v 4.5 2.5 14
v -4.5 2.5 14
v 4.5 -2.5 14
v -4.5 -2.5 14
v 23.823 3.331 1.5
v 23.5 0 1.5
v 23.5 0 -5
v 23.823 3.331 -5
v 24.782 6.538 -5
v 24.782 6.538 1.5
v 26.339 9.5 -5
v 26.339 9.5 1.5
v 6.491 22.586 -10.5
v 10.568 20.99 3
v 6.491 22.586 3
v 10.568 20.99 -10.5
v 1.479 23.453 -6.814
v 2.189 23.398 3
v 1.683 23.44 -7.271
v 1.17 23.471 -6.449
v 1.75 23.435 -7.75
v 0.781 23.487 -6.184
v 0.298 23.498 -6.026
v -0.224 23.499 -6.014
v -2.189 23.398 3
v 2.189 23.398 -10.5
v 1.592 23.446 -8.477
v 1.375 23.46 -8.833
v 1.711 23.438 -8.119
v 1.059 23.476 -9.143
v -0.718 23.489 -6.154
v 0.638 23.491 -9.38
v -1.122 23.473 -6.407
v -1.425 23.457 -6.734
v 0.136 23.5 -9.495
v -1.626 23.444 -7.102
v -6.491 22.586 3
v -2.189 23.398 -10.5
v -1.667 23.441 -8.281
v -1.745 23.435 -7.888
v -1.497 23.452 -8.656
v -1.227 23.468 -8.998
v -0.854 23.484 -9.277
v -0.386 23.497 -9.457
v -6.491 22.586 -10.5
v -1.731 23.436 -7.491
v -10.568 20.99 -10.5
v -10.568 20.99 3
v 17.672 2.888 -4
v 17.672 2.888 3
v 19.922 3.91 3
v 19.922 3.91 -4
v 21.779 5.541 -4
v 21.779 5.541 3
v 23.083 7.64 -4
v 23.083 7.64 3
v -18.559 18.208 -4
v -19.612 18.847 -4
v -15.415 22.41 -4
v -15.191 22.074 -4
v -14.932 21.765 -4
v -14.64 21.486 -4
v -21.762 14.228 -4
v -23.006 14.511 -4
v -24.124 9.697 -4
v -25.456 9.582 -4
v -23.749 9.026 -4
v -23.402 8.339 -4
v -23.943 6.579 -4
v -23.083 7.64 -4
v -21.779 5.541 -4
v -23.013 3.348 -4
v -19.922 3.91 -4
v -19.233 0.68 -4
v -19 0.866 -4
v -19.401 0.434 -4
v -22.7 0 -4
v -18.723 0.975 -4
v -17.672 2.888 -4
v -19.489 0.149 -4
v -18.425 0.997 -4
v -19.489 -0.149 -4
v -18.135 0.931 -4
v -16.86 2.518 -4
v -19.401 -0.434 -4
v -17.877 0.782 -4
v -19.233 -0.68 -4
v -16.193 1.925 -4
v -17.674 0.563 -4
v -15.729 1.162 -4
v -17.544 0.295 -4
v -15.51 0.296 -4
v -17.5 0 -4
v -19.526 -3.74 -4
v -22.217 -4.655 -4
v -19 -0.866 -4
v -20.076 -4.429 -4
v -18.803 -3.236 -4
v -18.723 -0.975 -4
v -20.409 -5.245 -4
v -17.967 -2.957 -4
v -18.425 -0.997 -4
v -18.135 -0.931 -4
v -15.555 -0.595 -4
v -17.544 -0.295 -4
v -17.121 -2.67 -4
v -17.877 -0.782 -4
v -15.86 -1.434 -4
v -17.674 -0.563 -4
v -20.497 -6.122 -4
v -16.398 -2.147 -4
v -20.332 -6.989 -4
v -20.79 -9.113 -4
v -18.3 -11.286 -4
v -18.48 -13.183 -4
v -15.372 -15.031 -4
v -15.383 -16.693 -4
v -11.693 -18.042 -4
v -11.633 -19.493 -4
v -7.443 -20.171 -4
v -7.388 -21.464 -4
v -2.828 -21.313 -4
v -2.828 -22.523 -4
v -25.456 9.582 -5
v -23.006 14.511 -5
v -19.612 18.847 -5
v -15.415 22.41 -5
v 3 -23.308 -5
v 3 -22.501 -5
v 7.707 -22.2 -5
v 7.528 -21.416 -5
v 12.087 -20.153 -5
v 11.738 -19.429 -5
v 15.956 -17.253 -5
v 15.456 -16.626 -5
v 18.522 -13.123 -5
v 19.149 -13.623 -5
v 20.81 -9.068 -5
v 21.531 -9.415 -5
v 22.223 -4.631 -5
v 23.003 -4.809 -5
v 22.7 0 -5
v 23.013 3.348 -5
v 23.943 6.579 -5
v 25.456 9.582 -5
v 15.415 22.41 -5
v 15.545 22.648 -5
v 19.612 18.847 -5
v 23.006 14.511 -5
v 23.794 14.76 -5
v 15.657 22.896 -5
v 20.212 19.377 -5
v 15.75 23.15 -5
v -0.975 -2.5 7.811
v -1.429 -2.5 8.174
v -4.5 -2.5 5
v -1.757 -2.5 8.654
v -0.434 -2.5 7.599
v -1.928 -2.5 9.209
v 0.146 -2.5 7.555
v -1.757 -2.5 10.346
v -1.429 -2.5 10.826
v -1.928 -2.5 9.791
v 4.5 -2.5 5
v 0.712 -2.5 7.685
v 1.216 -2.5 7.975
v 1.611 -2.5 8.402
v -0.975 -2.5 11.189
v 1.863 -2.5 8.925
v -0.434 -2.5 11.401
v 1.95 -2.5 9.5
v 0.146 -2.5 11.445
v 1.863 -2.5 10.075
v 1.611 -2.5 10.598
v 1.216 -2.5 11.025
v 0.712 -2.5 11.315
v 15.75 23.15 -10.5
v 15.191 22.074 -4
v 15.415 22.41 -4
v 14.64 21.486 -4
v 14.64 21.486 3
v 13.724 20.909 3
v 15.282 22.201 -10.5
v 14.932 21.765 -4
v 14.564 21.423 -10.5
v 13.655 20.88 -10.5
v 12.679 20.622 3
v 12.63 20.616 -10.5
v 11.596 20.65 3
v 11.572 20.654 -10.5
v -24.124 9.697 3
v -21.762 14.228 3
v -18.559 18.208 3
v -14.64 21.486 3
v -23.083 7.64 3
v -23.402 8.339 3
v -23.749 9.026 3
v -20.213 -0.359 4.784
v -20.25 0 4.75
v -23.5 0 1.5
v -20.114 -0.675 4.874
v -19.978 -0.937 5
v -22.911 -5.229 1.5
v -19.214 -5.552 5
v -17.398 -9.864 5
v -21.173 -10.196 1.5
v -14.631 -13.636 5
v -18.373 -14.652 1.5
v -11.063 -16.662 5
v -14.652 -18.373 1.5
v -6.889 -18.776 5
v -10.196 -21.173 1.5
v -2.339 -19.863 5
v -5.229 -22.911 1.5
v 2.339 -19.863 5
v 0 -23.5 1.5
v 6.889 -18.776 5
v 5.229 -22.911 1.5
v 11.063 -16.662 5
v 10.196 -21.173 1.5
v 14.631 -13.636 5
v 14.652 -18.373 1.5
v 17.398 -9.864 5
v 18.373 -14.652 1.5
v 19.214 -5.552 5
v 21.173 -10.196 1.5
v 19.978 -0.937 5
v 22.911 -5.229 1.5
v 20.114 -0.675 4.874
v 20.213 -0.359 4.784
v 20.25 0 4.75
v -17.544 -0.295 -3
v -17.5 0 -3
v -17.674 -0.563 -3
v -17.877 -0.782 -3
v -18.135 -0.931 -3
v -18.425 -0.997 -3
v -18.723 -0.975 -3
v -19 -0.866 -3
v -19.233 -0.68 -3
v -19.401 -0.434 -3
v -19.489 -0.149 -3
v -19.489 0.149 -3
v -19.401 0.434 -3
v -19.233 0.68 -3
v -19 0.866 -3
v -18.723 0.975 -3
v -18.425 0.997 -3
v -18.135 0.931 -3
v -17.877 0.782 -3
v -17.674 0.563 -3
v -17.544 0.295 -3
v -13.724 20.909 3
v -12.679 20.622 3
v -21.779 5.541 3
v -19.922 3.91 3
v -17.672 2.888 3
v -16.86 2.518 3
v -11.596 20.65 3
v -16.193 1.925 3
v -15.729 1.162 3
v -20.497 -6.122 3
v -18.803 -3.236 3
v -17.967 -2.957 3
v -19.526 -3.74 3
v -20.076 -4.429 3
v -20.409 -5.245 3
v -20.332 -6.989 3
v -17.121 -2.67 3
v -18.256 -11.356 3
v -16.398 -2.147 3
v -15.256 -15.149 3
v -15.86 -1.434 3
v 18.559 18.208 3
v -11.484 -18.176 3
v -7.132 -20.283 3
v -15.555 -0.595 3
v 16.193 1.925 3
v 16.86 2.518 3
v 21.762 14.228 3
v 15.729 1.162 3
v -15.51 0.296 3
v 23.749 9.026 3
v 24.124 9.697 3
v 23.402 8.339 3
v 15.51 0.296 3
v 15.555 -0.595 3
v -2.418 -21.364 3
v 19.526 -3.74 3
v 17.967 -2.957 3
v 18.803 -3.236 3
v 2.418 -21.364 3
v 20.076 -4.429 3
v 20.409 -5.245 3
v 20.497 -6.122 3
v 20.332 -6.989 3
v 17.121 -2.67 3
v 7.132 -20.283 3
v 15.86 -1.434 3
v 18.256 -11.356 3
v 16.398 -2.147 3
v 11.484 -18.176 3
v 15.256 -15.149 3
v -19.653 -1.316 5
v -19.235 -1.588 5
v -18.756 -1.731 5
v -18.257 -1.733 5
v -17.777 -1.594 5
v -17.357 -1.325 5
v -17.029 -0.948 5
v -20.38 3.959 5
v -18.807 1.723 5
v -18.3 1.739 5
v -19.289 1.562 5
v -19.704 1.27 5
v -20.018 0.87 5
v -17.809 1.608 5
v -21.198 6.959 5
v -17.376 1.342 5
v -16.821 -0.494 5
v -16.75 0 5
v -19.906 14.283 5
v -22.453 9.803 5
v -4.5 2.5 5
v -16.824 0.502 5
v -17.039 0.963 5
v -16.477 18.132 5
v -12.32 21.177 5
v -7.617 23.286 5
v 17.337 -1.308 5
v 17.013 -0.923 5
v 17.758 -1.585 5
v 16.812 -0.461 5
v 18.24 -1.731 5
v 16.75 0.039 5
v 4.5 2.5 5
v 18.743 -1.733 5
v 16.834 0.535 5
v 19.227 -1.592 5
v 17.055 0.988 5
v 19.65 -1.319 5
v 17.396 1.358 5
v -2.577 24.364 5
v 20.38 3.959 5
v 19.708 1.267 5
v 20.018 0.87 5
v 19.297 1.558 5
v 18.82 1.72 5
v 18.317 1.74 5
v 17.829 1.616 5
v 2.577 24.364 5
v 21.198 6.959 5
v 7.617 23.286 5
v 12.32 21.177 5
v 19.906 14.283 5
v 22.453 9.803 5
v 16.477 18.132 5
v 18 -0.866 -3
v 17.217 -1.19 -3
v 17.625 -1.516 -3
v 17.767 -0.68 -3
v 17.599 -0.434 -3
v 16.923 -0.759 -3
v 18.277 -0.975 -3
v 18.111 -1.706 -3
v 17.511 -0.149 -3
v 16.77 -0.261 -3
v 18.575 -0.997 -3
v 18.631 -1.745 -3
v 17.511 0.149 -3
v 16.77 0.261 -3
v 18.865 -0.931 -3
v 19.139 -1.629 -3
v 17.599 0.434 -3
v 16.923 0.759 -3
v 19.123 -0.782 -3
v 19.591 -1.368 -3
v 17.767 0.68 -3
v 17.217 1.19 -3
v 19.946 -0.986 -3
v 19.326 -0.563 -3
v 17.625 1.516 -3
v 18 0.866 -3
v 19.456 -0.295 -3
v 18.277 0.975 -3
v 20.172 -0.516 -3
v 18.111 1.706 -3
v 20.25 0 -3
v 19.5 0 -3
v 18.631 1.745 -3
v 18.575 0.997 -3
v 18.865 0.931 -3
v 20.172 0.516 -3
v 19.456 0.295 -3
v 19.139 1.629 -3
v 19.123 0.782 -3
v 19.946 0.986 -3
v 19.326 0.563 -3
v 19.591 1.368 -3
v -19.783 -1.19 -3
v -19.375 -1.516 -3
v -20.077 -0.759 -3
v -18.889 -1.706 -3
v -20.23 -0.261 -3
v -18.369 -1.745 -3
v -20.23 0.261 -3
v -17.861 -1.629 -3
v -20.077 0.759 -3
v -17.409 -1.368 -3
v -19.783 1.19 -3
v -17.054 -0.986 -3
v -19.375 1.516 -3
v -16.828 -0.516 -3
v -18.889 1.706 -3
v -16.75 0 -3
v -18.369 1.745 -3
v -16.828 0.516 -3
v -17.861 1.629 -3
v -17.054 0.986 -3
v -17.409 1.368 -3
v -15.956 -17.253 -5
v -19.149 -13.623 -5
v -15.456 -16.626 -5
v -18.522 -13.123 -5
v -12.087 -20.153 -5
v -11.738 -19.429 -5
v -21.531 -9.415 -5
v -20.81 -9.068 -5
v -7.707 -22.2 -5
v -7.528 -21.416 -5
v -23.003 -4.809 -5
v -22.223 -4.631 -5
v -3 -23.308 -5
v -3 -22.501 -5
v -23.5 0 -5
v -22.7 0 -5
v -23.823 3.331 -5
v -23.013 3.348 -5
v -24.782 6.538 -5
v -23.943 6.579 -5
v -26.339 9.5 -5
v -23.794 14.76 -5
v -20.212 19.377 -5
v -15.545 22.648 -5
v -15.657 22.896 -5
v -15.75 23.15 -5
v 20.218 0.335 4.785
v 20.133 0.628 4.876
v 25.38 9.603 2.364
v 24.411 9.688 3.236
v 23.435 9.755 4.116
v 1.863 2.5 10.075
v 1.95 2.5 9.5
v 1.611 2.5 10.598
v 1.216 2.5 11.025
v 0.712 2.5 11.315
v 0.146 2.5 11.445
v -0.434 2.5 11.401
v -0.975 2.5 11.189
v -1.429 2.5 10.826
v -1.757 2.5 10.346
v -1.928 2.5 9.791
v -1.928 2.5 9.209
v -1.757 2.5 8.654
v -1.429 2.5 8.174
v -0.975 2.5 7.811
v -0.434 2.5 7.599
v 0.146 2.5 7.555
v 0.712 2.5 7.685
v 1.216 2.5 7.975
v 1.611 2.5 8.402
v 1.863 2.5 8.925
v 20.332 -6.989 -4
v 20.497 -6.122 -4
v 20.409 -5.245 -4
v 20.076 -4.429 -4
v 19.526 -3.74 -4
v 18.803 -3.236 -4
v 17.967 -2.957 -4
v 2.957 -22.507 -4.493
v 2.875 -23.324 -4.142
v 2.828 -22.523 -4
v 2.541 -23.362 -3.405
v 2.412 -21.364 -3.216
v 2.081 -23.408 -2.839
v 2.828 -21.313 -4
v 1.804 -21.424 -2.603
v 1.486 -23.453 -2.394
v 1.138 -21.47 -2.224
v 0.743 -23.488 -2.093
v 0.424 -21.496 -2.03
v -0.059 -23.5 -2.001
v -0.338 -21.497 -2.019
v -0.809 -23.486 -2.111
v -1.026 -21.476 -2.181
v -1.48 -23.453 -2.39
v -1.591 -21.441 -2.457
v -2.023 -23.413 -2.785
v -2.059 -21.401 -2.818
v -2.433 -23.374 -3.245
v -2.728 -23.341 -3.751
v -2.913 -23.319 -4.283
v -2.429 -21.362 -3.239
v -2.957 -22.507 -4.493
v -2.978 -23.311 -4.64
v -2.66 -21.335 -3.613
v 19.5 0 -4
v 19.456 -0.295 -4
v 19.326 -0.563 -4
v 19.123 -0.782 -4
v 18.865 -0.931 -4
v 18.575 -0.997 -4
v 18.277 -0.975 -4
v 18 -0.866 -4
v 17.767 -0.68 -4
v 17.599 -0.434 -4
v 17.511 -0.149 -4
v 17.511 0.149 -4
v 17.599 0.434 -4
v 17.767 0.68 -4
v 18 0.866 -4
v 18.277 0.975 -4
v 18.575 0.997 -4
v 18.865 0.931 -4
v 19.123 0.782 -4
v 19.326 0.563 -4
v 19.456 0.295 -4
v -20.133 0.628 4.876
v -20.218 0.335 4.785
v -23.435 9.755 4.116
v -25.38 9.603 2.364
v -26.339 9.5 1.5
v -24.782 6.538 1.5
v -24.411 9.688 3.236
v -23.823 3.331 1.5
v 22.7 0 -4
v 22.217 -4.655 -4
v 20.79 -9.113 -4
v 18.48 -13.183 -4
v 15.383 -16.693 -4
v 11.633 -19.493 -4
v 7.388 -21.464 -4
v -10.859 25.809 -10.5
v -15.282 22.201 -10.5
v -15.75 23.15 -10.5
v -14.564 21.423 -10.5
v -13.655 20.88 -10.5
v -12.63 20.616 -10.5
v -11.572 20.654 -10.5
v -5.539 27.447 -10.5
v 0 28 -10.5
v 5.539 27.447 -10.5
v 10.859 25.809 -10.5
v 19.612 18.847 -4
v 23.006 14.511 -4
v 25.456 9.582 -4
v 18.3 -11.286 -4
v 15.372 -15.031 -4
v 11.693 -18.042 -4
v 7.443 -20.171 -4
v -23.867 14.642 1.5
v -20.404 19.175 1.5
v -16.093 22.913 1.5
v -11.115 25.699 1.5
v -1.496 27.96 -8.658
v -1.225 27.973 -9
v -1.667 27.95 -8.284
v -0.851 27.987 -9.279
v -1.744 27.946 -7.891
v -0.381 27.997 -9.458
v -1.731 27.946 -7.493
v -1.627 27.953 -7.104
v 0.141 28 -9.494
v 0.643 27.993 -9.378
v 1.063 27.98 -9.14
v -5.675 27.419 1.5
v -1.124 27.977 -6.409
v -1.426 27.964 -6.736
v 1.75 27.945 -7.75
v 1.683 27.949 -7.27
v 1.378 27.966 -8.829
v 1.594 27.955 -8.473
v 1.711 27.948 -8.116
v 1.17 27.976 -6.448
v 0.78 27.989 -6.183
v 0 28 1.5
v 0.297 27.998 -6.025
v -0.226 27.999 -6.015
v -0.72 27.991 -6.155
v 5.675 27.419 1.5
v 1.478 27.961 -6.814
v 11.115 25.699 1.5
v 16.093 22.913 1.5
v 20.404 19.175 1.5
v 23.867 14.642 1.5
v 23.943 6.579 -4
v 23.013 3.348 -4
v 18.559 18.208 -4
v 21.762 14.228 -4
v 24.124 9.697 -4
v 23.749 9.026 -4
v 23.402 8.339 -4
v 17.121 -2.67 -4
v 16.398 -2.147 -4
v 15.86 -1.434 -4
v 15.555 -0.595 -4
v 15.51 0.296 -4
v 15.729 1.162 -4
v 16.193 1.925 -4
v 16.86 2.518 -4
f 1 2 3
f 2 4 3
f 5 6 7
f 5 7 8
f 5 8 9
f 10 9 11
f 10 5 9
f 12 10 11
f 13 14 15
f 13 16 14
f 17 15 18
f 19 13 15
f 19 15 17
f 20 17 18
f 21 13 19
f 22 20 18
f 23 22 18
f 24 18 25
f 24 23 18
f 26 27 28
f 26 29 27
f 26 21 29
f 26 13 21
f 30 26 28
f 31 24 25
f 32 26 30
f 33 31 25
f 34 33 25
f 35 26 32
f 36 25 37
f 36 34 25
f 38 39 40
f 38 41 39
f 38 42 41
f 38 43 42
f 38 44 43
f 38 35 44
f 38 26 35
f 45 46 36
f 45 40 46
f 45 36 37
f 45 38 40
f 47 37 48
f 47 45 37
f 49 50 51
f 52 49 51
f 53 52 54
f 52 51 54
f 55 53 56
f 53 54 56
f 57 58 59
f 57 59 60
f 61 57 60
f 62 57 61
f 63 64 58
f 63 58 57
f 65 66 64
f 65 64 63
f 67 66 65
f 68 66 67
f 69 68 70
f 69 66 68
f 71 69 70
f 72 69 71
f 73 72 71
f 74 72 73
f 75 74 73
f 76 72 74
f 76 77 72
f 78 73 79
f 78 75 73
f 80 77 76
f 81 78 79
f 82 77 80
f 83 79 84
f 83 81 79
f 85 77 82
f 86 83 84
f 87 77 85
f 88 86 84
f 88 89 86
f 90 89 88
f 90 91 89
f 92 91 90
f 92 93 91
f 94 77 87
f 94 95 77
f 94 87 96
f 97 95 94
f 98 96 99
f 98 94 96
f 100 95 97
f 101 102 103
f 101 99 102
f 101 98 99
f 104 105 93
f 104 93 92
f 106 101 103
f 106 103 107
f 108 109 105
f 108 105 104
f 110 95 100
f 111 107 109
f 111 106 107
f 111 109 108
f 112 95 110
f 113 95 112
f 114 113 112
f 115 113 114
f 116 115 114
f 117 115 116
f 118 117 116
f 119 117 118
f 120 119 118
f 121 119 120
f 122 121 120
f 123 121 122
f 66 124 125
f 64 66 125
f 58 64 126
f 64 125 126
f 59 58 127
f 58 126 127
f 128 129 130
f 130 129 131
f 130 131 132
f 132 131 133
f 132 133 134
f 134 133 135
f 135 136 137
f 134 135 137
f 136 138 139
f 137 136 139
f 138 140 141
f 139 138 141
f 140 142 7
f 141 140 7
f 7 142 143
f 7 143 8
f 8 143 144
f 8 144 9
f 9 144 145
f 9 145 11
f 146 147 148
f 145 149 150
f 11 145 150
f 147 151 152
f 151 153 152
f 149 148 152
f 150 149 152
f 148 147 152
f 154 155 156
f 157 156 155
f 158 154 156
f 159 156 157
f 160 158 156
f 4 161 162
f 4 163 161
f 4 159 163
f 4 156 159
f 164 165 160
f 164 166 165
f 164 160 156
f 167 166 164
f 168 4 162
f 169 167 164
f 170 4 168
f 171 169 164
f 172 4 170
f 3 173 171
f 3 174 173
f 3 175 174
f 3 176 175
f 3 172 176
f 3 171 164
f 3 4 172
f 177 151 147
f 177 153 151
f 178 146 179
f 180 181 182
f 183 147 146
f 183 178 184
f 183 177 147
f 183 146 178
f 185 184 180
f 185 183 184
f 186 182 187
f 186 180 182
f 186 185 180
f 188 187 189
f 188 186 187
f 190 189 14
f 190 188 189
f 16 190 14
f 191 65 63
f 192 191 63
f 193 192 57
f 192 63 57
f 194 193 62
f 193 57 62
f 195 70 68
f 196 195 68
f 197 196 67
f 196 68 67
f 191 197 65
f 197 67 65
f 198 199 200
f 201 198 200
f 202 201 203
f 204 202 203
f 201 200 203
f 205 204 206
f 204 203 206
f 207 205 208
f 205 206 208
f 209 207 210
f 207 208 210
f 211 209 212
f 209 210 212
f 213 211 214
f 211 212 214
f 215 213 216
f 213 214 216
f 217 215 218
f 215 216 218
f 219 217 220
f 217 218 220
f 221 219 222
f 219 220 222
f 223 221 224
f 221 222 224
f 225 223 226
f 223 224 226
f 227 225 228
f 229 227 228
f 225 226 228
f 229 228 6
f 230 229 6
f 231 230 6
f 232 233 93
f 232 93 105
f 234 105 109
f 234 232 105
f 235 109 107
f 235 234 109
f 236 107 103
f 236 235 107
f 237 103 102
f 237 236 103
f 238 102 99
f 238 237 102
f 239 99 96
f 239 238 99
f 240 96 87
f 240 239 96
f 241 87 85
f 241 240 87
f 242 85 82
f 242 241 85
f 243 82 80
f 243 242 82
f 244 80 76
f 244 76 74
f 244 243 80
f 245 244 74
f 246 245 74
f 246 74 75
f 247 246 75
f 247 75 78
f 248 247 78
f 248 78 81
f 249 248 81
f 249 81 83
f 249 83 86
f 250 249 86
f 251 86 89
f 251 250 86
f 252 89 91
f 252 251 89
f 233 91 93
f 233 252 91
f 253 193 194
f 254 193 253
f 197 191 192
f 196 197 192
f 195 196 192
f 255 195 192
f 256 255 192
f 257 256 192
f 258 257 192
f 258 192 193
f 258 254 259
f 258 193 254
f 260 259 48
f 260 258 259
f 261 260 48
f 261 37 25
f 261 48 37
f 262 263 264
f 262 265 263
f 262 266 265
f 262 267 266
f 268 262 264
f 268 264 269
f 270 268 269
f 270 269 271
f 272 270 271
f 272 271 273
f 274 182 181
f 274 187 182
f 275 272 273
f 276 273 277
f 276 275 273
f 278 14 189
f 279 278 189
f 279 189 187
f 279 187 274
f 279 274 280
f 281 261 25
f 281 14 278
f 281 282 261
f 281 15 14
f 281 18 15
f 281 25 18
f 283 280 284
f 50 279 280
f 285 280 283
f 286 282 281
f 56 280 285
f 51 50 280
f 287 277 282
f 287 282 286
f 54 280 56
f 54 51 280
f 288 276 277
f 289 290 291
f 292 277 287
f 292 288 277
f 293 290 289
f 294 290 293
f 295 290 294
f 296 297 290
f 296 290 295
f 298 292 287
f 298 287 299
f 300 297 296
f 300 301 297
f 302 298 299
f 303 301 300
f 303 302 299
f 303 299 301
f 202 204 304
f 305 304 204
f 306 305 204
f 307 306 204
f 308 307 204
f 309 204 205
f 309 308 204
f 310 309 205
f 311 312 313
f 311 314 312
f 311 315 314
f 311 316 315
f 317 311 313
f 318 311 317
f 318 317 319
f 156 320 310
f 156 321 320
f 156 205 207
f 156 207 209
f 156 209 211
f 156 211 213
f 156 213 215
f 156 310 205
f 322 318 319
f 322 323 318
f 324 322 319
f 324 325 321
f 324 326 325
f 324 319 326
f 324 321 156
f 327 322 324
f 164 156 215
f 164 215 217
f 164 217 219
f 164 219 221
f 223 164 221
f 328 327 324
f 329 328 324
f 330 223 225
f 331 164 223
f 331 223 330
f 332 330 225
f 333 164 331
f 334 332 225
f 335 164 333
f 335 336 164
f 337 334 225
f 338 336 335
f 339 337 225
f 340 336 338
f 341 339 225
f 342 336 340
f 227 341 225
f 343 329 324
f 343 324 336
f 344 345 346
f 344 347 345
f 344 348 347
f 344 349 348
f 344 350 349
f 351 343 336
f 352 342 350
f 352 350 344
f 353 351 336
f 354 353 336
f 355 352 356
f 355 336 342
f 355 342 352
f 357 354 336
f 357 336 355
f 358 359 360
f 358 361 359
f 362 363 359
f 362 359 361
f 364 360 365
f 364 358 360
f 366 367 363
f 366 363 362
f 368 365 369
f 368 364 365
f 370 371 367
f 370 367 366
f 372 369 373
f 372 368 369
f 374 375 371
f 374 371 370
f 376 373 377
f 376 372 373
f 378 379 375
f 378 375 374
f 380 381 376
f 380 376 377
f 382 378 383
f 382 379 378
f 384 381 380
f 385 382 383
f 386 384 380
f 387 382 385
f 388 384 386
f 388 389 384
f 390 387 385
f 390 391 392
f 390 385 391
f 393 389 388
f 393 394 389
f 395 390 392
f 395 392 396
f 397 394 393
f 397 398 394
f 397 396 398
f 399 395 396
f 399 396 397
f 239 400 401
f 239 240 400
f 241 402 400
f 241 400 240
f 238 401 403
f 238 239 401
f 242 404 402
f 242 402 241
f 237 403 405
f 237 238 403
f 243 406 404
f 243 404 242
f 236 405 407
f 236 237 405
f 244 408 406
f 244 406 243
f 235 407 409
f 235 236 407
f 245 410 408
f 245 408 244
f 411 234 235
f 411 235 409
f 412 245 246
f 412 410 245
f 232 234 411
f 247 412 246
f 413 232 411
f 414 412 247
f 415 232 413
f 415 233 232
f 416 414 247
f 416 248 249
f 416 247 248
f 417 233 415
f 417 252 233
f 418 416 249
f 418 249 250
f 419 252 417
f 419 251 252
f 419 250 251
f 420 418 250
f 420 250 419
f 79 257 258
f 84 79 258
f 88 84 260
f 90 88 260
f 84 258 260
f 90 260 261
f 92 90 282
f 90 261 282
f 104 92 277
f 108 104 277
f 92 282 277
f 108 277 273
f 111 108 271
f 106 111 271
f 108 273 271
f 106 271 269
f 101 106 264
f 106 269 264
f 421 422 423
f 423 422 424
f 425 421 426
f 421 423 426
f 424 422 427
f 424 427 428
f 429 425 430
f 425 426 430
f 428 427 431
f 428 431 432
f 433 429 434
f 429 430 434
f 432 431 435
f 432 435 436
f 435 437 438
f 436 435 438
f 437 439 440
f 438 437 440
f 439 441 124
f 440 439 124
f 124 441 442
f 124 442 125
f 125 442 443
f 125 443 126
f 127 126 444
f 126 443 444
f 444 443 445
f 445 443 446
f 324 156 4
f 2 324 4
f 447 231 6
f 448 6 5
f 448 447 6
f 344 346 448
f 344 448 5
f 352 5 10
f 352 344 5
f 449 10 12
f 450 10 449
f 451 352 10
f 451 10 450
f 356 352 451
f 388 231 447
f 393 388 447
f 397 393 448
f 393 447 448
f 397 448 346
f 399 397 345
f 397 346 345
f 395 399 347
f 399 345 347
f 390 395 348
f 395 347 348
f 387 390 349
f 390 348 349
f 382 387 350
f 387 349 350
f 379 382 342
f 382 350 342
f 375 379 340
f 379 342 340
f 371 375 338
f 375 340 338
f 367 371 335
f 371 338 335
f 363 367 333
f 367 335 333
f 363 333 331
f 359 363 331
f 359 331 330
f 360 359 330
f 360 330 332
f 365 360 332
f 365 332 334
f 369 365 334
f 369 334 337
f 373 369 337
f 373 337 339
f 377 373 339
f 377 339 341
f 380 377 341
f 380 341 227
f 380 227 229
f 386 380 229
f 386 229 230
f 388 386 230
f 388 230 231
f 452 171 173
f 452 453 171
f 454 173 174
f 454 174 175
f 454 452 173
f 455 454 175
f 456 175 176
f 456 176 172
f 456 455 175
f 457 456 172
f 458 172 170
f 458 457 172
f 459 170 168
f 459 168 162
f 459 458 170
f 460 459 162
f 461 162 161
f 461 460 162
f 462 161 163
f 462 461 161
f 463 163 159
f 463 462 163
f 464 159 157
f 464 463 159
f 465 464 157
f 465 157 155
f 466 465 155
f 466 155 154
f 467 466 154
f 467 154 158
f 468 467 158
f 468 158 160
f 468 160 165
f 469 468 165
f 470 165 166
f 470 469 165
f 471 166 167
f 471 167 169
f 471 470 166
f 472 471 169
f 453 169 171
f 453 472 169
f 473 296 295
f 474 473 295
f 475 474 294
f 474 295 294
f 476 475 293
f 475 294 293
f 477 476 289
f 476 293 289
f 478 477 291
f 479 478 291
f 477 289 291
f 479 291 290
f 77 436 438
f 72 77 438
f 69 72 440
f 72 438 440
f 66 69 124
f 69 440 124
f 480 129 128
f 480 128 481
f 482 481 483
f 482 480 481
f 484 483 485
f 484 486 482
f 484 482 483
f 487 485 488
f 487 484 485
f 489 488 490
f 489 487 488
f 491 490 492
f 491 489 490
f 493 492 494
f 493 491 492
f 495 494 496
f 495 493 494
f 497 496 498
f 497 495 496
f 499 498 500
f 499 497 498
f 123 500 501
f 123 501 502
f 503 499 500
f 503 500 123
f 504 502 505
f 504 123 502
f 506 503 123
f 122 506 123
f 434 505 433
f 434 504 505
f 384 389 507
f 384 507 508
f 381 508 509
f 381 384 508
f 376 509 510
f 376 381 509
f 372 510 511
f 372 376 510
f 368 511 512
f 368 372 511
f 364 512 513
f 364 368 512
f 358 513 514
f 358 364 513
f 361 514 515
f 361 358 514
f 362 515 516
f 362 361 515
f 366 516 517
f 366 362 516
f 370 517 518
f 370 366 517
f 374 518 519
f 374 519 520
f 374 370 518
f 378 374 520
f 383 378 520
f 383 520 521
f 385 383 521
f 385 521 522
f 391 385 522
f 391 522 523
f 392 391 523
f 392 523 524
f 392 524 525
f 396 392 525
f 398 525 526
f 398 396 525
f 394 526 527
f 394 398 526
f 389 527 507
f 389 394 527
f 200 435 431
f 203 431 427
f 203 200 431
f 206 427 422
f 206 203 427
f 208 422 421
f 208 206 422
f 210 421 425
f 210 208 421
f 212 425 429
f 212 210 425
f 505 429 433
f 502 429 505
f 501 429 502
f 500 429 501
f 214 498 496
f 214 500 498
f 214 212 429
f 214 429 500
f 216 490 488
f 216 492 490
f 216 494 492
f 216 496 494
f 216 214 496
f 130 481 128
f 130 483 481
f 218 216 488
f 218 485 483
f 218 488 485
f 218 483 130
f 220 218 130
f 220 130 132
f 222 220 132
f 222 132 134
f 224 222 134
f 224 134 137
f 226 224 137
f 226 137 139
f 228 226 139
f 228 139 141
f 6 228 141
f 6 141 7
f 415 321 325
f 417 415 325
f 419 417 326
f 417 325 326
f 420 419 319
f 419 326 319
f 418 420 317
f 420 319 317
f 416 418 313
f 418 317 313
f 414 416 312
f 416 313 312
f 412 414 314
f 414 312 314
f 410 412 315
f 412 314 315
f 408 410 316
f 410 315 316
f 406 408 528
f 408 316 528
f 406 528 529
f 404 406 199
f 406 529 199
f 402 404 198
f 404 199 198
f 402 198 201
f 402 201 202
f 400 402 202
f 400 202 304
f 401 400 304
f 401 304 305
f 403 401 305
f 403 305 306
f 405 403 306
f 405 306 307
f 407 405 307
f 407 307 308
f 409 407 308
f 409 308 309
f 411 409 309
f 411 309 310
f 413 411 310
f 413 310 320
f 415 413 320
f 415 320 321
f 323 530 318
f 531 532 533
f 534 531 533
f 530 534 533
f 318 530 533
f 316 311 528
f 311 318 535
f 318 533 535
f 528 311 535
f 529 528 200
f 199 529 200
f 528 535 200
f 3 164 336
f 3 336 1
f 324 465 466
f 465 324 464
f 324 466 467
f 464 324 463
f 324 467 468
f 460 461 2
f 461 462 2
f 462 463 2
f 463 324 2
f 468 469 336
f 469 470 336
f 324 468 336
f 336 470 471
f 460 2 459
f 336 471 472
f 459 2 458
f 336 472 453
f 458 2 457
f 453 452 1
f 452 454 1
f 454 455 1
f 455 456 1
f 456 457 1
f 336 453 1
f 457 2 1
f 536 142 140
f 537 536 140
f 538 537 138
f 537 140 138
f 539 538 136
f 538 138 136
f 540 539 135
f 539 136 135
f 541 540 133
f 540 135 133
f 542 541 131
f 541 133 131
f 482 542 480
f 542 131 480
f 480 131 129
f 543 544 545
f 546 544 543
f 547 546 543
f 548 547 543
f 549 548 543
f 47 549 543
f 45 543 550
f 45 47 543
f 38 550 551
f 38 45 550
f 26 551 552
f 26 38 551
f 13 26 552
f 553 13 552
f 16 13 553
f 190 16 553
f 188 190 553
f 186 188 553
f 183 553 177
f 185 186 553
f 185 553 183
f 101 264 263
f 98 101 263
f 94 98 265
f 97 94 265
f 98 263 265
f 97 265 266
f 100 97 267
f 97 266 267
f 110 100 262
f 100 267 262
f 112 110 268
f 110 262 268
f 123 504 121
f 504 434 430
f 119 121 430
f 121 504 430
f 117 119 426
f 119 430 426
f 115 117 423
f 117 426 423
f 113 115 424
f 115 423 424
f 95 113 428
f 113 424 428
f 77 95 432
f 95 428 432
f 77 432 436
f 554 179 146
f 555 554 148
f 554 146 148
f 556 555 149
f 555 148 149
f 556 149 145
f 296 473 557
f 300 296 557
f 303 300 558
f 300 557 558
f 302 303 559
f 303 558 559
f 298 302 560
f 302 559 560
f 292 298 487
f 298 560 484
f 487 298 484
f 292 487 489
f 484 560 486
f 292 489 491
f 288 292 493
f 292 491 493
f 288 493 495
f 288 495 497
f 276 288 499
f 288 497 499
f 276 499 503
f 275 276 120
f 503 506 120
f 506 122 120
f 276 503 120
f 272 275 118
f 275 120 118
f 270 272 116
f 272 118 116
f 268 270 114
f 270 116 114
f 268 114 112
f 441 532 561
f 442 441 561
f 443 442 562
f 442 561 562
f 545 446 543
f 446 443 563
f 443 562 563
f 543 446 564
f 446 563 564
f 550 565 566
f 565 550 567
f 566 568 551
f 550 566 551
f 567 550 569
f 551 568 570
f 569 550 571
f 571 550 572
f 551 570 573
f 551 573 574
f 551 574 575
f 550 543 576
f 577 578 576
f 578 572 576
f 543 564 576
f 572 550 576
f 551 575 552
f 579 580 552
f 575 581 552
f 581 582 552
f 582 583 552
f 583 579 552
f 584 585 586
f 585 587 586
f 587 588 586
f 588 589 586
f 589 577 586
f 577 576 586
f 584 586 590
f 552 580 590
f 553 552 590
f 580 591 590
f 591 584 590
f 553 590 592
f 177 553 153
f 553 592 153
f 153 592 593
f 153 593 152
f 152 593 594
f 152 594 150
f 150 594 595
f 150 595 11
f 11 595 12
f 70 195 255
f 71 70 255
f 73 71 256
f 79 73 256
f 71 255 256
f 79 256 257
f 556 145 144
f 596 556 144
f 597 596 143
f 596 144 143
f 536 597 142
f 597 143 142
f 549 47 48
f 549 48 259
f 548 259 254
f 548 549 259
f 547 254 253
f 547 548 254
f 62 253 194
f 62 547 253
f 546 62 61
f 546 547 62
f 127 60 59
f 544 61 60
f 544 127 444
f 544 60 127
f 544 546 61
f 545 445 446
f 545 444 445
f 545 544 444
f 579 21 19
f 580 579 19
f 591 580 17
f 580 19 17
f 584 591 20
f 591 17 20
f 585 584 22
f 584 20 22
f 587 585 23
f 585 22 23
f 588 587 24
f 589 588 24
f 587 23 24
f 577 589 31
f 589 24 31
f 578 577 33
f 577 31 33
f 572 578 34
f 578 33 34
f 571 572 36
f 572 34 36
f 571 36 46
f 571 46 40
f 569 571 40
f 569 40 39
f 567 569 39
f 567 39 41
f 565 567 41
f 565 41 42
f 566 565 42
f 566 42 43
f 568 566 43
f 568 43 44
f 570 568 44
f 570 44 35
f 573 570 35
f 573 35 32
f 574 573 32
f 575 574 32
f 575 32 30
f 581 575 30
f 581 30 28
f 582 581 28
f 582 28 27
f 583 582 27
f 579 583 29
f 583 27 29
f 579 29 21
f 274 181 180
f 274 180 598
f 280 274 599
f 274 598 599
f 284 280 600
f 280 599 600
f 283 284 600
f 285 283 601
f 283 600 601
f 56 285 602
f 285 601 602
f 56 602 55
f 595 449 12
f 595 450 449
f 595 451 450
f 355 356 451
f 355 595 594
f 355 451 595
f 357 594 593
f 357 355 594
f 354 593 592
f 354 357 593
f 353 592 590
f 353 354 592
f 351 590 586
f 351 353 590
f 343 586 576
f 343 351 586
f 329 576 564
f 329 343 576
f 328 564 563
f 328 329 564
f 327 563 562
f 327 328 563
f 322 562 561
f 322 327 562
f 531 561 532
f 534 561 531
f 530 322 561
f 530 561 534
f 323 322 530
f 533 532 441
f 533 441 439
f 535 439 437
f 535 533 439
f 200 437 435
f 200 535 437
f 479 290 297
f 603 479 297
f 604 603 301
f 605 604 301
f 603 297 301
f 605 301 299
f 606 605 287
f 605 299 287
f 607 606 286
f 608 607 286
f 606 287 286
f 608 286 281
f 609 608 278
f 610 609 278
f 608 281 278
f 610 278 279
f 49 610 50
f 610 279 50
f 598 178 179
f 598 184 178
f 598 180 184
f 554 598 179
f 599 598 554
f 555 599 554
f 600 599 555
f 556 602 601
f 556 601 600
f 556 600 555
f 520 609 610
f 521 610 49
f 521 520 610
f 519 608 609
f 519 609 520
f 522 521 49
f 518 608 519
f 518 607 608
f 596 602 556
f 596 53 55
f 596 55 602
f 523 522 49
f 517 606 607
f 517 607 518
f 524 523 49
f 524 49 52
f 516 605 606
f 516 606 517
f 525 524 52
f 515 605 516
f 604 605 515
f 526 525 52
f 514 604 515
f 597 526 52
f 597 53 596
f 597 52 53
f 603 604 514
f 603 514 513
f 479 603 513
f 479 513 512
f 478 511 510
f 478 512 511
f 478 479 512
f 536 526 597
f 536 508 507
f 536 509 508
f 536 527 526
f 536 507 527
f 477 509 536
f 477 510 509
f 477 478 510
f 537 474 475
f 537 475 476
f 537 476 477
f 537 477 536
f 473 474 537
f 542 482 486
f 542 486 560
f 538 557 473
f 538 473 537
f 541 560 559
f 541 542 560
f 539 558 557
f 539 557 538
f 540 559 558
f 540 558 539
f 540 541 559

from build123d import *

# Parameters (mm, degrees)
F0_R         = 1
F1_DEPTH     = 5
F3_DEPTH     = 8
F5_DEPTH     = 1
F6_R         = 1
F7_DEPTH     = 7
F8_R         = 1.75
F9_DEPTH     = 8
F10_R        = 3
F11_DEPTH    = 23.501
F12_W        = 9
F12_H        = 9
F12_R        = 1.95
F13_DEPTH    = 2.5
F16_DEPTH    = 6.5
F17_DEPTH    = 7
F18_R        = 1.75
F19_DEPTH    = 28.001
F20_T2_ANGLE = 180
F20_T4_ANGLE = 63.0666087428
F20_T6_ANGLE = 177.2059132033
F20_T8_ANGLE = 63.0666087428


# Not quite as in the source:
# - a fillet or chamfer that OpenCascade refuses, or shapes differently, is made with other operations: its cross-section is extruded or revolved along the edge and cut away or added


with BuildPart() as f1:
    # F0 (on Top) → F1 (new body, symmetric)
    with BuildSketch(Plane.XY):
        with BuildLine():
            ThreePointArc((-26.3391343821, 9.5), (-24.2249616205, 4.9575872166), (-23.5, 0))
            ThreePointArc((-23.5, 0), (0, -23.5), (23.5, 0))
            ThreePointArc((23.5, 0), (24.2249616205, 4.9575872166), (26.3391343821, 9.5))
            ThreePointArc((26.3391343821, 9.5), (0, 28), (-26.3391343821, 9.5))
        make_face()
        with Locations((-18.5, 0)):
            Circle(F0_R, mode=Mode.SUBTRACT)
        with Locations((18.5, 0)):
            Circle(F0_R, mode=Mode.SUBTRACT)
    extrude(amount=F1_DEPTH, both=True)

    # F2 (on face) → F3 (cut)
    with BuildSketch(Plane(origin=(0, 0, -5), x_dir=(1, 0, 0), z_dir=(0, 0, -1))):
        with BuildLine():
            ThreePointArc((21.5, 0), (0, 21.5), (-21.5, 0))
            ThreePointArc((-21.5, 0), (-22.1675592341, -5.0230125511), (-24.12389255, -9.6973093298))
            ThreePointArc((-24.12389255, -9.6973093298), (0, -26), (24.12389255, -9.6973093298))
            ThreePointArc((24.12389255, -9.6973093298), (22.1675592341, -5.023012551), (21.5, 0))
        make_face()
    extrude(amount=-F3_DEPTH, mode=Mode.SUBTRACT)

    # F4 (on face) → F5 (cut)
    with BuildSketch(Plane(origin=(0, 0, -5), x_dir=(1, 0, 0), z_dir=(0, 0, -1))):
        with BuildLine():
            ThreePointArc((22.7, 0), (0, 22.7), (-22.7, 0))
            ThreePointArc((-22.7, 0), (-23.4028138558, -4.9851365308), (-25.4564681735, -9.5816610319))
            ThreePointArc((-25.4564681735, -9.5816610319), (0, -27.2), (25.4564681736, -9.5816610318))
            ThreePointArc((25.4564681736, -9.5816610318), (23.4028138558, -4.9851365307), (22.7, 0))
        make_face()
    extrude(amount=-F5_DEPTH, mode=Mode.SUBTRACT)

    # F6 (on face) → F7 (join, through all)
    with BuildSketch(Plane(origin=(0, 0, 3), x_dir=(1, 0, 0), z_dir=(0, 0, -1))):
        with BuildLine():
            ThreePointArc((-17.6723561014, -2.888314352), (-15.4992475751, 0.1511261164), (-17.9667347728, 2.9568534655))
            ThreePointArc((-17.9667347728, 2.9568534655), (-20.0762140714, 4.428973477), (-20.3324952956, 6.9885359735))
            ThreePointArc((-20.3324952956, 6.9885359735), (-22.8497447738, -0.1109553271), (-23.0826374703, -7.6399049653))
            ThreePointArc((-23.0826374703, -7.6399049653), (-20.9107637858, -4.6569183518), (-17.6723561014, -2.888314352))
        make_face()
        with Locations((-18.5, 0)):
            Circle(F6_R, mode=Mode.SUBTRACT)
        with BuildLine():
            ThreePointArc((20.3324952956, 6.9885359735), (20.0762140714, 4.428973477), (17.9667347728, 2.9568534655))
            ThreePointArc((17.9667347728, 2.9568534655), (15.4992475751, 0.1511261164), (17.6723561014, -2.888314352))
            ThreePointArc((17.6723561014, -2.888314352), (20.9107637858, -4.6569183518), (23.0826374703, -7.6399049653))
            ThreePointArc((23.0826374703, -7.6399049653), (22.9151781731, -0.0986538692), (20.3324952956, 6.9885359735))
        make_face()
        with Locations((18.5, 0)):
            Circle(F6_R, mode=Mode.SUBTRACT)
    extrude(amount=F7_DEPTH)

    # F8 (on face) → F9 (cut)
    with BuildSketch(Plane.XY.offset(5)):
        with Locations((-18.5, 0)):
            Circle(F8_R)
        with Locations((18.5, 0)):
            Circle(F8_R)
    extrude(amount=-F9_DEPTH, mode=Mode.SUBTRACT)

    # F10 (on Front) → F11 (cut, through all)
    with BuildSketch(Plane.XZ):
        with Locations((0, -5)):
            Circle(F10_R)
    extrude(amount=F11_DEPTH, mode=Mode.SUBTRACT)

    # F12 (on Front) → F13 (join, symmetric)
    with BuildSketch(Plane.XZ):
        with Locations((0, 9.5)):
            Rectangle(F12_W, F12_H)
        with Locations((0, 9.5)):
            Circle(F12_R, mode=Mode.SUBTRACT)
    extrude(amount=F13_DEPTH, both=True)

    # F15 (on face) → F16 (join)
    with BuildSketch(Plane(origin=(0, 0, -4), x_dir=(1, 0, 0), z_dir=(0, 0, -1))):
        with BuildLine():
            ThreePointArc((10.5675868988, -20.9899048863), (0, -23.5), (-10.5675868988, -20.9899048863))
            ThreePointArc((-10.5675868988, -20.9899048863), (-13.6551032171, -20.8795666046), (-15.75, -23.1503239718))
            ThreePointArc((-15.75, -23.1503239718), (0, -28), (15.75, -23.1503239718))
            ThreePointArc((15.75, -23.1503239718), (13.6551032171, -20.8795666046), (10.5675868988, -20.9899048863))
        make_face()
    extrude(amount=F16_DEPTH)

    # F15 (on face) → F17 (join, through all)
    with BuildSketch(Plane(origin=(0, 0, -4), x_dir=(1, 0, 0), z_dir=(0, 0, -1))):
        with BuildLine():
            ThreePointArc((10.5675868988, -20.9899048863), (0, -23.5), (-10.5675868988, -20.9899048863))
            ThreePointArc((-10.5675868988, -20.9899048863), (-13.6551032171, -20.8795666046), (-15.75, -23.1503239718))
            ThreePointArc((-15.75, -23.1503239718), (0, -28), (15.75, -23.1503239718))
            ThreePointArc((15.75, -23.1503239718), (13.6551032171, -20.8795666046), (10.5675868988, -20.9899048863))
        make_face()
    extrude(amount=-F17_DEPTH)

    # F18 (on Front) → F19 (cut, through all)
    with BuildSketch(Plane.XZ):
        with Locations((0, -7.75)):
            Circle(F18_R)
    extrude(amount=-F19_DEPTH, mode=Mode.SUBTRACT)

    # F20: chamfer of 3.5 on 4 edges, made by hand

    # F20_s1 → F20_t2 (revolve, cut)
    with BuildSketch(Plane.XZ):
        Polygon((-20, 5), (-23.5, 1.5), (-23.5, 5), align=None)
    revolve(axis=Axis((0, 0, 5), (0, 0, 1)), revolution_arc=F20_T2_ANGLE, mode=Mode.SUBTRACT)

    # F20_s3 → F20_t4 (revolve, cut)
    with BuildSketch(Plane.XZ):
        Polygon((23.5, 1.5), (20, 5), (23.5, 5), align=None)
    revolve(axis=Axis((40.8134960885, 0, 5), (0, 0, -1)), revolution_arc=F20_T4_ANGLE, mode=Mode.SUBTRACT)

    # F20_s5 → F20_t6 (revolve, cut)
    with BuildSketch(Plane(origin=(0, 0, 0), x_dir=(0, 0, 1), z_dir=(0.0243805911, -0.9997027492, 0))):
        Polygon((1.5, -28), (5, -24.5), (5, -28), align=None)
    revolve(axis=Axis((0, 0, 5), (0, 0, 1)), revolution_arc=F20_T6_ANGLE, mode=Mode.SUBTRACT)

    # F20_s7 → F20_t8 (revolve, cut)
    with BuildSketch(Plane(origin=(-32.4398868868, 16.4814724869, 0), x_dir=(0, 0, 1), z_dir=(-0.8915337049, 0.4529543608, 0))):
        Polygon((5, 2.326845056), (1.5, -1.173154944), (5, -1.173154944), align=None)
    revolve(axis=Axis((-40.8134960885, 0, 5), (0, 0, -1)), revolution_arc=F20_T8_ANGLE, mode=Mode.SUBTRACT)


solid = f1.part
